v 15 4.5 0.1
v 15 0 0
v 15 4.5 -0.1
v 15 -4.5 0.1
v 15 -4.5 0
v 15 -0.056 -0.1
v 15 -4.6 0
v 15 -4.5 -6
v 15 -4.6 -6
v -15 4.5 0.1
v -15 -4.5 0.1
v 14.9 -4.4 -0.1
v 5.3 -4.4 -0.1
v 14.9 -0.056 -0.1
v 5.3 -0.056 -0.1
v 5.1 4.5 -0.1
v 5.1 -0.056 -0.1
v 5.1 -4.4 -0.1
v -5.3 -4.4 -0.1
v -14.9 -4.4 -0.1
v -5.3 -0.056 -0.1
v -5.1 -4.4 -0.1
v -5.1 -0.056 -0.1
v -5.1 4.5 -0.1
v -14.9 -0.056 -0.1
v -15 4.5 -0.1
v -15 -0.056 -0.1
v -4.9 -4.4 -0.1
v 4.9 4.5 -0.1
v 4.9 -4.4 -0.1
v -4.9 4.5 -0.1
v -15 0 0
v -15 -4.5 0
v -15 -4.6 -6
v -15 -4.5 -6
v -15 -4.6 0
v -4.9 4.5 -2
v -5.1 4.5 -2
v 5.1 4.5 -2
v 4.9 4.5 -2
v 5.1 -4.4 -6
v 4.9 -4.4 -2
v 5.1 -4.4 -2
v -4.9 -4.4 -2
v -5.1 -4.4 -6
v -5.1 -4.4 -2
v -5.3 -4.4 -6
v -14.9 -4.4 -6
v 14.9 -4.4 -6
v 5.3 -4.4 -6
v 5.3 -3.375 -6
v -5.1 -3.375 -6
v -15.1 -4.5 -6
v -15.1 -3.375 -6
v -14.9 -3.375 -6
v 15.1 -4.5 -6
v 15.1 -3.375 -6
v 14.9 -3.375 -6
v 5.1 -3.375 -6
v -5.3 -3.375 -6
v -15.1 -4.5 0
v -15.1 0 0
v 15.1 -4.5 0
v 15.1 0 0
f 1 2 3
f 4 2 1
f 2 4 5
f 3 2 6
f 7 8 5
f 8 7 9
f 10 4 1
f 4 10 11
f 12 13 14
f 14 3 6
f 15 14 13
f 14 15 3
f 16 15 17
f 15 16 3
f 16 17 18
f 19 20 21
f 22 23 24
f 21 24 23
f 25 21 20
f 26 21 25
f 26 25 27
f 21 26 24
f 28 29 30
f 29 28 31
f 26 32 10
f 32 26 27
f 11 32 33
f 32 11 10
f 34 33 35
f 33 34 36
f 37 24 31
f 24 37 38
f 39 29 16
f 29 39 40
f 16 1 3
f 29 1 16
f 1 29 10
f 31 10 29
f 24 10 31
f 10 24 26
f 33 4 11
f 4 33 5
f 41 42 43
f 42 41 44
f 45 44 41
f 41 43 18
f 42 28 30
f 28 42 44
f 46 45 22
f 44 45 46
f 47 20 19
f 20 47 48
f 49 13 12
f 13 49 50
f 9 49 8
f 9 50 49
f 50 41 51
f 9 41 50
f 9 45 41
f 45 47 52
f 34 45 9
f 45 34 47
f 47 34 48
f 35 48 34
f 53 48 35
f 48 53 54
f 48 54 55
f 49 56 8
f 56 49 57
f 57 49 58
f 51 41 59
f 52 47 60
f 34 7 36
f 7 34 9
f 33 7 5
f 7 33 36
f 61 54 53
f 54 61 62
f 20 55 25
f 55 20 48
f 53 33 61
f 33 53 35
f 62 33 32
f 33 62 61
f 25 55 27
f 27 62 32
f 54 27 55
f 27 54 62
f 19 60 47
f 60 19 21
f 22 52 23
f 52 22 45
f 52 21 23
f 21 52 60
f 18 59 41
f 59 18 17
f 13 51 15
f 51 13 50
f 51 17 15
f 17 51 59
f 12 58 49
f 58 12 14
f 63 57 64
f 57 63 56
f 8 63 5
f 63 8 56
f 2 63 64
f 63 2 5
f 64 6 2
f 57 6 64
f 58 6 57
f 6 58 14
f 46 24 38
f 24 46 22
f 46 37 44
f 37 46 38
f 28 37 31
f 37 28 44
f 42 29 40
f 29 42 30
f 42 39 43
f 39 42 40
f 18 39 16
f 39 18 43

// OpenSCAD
// file: library/sheet.scad
//-----------------------------------------------------------------------------
// conventions:
//  * x -- width
//  * y -- height
//  * z -- thickness
//  * sheets start at a corner, thickness centered
//-----------------------------------------------------------------------------

function thickness() = 0.2;

//-----------------------------------------------------------------------------

module trapezium(wt, wb, h, thick = thickness()) {
  a = wb - wt;
  b = h;
  rot = atan(a / b);

  cut_h = h / cos(rot) * 1.1;
  // cut_w doesn't need to be calculated; it's enough to use max(wt,wb)
  // (an overkill, but who cares?)

  w = max(wb, wt); // longer of the widths

  difference() {
    sheet(w, h, thick);

    translate([wb, 0, 0])
    rotate([0, 0, rot])
    sheet(w, cut_h, thick * 2);
  }
}

//-----------------------------------------------------------------------------

// TODO: orientation
module sheet(w = 10, h = 10, thick = thickness()) {
  translate([0, 0, -thick / 2])
  cube([w, h, thick]);
}

//-----------------------------------------------------------------------------
// vim:ft=openscad
// main file
//----------------------------------------------------------------------------

use <library/sheet.scad>;

//----------------------------------------------------------------------------

shelflength = 30;
shelfwidth = 9;
backheight = 6;

// blat i plecy
union() {
  translate([-(shelflength / 2), -(shelfwidth / 2), 0])
  sheet(shelflength, shelfwidth);

  translate([-(shelflength / 2), -(shelfwidth / 2), 0])
  rotate([-90, 0, 0])
  sheet(shelflength, backheight);
}

// usztywnienie blatu
translate([-shelflength / 6, 0, 0])
hsupport();
translate([ shelflength / 6, 0, 0])
hsupport();

// usztywnienie plecow
for (s = [0, shelflength / 3 - thickness(), 2 * shelflength / 3 + thickness(), shelflength]) {
  translate([-shelflength / 2 + s, -shelfwidth / 2, 0])
  vsupport();
}

//----------------------------------------------------------------------------

module hsupport() {
  hswidth = 2;
  translate([0, -(shelfwidth / 2), 0])
  rotate([-90, 0, 90])
  sheet(w = shelfwidth, h = hswidth);
}

module vsupport() {
  rotate([-90, 0, 90])
  trapezium(wt = shelfwidth / 8, wb = shelfwidth / 2, h = backheight);
}

//----------------------------------------------------------------------------
// vim:ft=openscad
